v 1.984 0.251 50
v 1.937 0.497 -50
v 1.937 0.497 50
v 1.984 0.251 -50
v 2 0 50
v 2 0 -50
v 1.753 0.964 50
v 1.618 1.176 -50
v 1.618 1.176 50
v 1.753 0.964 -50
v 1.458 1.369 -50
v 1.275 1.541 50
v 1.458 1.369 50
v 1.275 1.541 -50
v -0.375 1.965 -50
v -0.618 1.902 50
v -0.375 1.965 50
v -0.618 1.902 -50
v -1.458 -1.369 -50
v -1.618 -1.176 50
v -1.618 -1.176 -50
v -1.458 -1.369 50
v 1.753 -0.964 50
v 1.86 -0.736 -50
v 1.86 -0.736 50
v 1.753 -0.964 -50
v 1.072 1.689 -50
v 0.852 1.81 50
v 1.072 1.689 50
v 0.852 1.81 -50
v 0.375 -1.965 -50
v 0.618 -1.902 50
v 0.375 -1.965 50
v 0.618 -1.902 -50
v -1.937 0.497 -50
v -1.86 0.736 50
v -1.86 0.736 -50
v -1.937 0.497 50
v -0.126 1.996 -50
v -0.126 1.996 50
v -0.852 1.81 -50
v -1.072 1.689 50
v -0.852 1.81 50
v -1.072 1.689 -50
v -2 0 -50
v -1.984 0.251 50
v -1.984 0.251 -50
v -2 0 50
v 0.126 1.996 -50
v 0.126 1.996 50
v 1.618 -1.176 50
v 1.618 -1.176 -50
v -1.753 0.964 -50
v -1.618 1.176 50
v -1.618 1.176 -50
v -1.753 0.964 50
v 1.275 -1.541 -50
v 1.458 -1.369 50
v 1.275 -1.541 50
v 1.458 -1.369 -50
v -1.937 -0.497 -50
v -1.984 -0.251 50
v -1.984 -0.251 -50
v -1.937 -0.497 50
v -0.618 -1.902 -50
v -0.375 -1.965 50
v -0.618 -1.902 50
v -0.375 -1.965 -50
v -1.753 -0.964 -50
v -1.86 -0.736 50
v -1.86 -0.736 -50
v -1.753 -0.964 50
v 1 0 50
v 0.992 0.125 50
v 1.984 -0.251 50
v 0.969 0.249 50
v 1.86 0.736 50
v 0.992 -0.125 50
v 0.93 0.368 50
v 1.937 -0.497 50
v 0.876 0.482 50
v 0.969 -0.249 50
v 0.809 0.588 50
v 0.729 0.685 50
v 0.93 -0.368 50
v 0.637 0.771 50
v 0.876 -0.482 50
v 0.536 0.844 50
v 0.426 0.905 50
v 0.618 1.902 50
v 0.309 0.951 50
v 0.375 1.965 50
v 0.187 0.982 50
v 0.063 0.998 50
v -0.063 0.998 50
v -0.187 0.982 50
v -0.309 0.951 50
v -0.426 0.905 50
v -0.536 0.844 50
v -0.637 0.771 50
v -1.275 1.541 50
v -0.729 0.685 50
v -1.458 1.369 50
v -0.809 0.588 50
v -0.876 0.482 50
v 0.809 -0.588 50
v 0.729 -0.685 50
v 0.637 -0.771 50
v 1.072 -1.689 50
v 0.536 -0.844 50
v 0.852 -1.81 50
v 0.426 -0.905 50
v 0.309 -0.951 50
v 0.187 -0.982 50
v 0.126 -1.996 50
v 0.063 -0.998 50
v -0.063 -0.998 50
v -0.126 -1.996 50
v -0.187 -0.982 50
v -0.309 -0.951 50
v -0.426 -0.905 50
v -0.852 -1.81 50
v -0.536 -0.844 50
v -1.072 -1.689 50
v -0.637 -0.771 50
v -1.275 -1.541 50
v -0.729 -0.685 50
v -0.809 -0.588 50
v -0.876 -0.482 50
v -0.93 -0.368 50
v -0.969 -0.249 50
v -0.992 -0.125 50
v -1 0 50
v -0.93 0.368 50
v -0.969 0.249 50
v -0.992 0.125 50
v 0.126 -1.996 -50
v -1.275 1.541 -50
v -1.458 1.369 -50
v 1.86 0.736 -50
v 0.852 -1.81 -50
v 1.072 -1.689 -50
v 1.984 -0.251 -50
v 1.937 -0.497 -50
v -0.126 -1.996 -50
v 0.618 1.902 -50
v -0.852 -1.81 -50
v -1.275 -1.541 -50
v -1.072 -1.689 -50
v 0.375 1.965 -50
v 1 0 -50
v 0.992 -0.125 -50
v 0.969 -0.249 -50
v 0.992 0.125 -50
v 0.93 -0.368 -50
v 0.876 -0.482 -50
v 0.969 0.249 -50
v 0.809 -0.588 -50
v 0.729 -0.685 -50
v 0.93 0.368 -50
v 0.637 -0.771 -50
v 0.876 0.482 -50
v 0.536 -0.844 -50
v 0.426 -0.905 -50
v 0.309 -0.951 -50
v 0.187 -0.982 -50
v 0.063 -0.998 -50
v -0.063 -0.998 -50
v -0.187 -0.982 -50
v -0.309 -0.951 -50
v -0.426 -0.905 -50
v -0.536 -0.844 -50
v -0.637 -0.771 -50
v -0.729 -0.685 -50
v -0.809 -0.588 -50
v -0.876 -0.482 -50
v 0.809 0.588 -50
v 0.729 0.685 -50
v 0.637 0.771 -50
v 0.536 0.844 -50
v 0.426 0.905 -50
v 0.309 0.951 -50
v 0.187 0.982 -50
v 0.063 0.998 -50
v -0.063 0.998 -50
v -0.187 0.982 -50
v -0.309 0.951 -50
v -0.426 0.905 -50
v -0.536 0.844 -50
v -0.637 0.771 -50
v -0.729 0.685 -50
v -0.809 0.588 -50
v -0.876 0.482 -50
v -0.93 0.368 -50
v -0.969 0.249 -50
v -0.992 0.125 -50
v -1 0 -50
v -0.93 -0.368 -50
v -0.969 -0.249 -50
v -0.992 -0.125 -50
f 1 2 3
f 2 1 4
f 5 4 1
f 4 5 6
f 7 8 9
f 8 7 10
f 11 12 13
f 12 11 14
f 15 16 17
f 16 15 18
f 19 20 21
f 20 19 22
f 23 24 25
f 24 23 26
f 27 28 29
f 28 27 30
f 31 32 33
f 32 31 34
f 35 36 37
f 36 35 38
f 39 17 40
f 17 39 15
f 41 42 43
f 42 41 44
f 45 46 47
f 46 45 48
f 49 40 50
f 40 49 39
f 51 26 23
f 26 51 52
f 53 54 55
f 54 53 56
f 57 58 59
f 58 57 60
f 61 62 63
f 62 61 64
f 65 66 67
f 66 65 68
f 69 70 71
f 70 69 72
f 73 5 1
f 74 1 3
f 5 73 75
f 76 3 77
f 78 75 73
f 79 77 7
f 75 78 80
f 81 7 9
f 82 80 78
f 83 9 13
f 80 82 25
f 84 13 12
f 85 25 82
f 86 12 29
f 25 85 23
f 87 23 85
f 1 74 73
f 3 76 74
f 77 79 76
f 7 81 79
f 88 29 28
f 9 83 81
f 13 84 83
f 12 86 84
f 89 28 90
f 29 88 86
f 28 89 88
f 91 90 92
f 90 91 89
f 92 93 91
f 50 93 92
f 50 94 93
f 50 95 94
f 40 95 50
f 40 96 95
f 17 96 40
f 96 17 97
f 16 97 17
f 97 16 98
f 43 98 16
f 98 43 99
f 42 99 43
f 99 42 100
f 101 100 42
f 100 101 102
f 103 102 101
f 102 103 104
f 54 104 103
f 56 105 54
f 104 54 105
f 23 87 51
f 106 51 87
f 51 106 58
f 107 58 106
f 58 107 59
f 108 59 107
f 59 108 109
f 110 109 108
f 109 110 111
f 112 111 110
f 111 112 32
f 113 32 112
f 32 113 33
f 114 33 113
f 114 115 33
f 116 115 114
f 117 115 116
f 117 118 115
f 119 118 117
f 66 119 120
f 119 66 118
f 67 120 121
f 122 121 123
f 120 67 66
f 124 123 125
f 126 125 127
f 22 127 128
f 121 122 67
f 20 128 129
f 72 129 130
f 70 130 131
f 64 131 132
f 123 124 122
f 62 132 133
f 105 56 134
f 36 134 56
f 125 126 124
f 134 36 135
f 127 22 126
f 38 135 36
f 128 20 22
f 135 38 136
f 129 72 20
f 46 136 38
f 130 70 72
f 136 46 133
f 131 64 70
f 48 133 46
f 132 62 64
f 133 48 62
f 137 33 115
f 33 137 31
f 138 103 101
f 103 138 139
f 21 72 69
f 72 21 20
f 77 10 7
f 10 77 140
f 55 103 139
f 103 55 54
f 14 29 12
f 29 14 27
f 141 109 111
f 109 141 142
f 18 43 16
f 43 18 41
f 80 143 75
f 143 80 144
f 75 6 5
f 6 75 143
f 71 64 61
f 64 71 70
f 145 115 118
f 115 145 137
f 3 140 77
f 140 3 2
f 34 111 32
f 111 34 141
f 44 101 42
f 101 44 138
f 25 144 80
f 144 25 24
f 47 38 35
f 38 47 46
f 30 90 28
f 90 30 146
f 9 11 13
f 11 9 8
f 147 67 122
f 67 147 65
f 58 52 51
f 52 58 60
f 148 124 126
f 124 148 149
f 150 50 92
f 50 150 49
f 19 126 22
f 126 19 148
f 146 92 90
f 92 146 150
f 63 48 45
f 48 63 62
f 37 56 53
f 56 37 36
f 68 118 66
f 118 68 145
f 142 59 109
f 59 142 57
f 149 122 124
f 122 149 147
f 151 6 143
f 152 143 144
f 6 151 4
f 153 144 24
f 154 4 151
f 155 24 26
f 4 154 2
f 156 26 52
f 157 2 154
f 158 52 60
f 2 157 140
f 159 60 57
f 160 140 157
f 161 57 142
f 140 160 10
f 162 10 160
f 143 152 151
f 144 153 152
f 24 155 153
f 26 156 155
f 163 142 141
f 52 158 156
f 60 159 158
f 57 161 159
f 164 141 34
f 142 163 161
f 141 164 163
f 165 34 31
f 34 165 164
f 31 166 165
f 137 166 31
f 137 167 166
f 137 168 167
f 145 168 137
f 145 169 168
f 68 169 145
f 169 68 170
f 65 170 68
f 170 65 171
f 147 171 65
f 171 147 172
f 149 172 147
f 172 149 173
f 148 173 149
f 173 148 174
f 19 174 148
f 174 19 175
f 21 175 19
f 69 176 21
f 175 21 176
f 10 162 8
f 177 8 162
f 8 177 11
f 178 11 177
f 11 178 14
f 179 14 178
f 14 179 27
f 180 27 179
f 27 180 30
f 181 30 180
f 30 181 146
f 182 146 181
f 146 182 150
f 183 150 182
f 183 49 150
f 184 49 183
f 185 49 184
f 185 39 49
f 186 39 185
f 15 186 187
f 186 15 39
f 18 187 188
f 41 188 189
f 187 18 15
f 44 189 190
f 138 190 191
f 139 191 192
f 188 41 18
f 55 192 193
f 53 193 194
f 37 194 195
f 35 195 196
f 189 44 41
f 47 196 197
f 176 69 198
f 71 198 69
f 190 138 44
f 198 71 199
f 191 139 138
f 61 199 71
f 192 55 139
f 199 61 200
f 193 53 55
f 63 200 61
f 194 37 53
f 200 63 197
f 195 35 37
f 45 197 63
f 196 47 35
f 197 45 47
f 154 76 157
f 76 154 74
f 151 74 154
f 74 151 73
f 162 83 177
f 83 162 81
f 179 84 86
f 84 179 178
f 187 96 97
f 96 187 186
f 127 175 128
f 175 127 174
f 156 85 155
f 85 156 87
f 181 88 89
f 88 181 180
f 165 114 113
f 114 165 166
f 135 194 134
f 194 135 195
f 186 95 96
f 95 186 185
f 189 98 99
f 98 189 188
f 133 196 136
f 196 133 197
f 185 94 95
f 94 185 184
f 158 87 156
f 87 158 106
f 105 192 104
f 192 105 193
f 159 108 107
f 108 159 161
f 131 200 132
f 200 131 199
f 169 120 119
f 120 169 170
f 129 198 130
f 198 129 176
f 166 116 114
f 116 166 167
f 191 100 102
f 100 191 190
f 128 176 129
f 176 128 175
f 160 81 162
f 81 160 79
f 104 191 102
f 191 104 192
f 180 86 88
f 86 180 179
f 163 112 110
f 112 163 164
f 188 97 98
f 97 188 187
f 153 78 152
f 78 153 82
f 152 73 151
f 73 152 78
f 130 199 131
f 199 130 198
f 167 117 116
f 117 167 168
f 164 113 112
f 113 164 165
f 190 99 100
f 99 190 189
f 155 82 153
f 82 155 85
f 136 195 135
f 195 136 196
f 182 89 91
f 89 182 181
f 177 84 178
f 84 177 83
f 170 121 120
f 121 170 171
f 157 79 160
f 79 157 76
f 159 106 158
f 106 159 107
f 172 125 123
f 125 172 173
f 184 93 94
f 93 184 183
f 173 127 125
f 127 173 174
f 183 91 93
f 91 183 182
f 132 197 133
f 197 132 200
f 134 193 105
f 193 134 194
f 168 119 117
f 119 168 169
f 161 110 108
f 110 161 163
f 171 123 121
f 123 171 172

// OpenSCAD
$fn = 50;


difference() {
	union() {
		translate(v = [0, 0, -50.0000000000]) {
			cylinder(h = 100, r = 2.0000000000);
		}
	}
	union() {
		translate(v = [0, 0, -100.0000000000]) {
			cylinder(h = 200, r = 1.0000000000);
		}
	}
}
